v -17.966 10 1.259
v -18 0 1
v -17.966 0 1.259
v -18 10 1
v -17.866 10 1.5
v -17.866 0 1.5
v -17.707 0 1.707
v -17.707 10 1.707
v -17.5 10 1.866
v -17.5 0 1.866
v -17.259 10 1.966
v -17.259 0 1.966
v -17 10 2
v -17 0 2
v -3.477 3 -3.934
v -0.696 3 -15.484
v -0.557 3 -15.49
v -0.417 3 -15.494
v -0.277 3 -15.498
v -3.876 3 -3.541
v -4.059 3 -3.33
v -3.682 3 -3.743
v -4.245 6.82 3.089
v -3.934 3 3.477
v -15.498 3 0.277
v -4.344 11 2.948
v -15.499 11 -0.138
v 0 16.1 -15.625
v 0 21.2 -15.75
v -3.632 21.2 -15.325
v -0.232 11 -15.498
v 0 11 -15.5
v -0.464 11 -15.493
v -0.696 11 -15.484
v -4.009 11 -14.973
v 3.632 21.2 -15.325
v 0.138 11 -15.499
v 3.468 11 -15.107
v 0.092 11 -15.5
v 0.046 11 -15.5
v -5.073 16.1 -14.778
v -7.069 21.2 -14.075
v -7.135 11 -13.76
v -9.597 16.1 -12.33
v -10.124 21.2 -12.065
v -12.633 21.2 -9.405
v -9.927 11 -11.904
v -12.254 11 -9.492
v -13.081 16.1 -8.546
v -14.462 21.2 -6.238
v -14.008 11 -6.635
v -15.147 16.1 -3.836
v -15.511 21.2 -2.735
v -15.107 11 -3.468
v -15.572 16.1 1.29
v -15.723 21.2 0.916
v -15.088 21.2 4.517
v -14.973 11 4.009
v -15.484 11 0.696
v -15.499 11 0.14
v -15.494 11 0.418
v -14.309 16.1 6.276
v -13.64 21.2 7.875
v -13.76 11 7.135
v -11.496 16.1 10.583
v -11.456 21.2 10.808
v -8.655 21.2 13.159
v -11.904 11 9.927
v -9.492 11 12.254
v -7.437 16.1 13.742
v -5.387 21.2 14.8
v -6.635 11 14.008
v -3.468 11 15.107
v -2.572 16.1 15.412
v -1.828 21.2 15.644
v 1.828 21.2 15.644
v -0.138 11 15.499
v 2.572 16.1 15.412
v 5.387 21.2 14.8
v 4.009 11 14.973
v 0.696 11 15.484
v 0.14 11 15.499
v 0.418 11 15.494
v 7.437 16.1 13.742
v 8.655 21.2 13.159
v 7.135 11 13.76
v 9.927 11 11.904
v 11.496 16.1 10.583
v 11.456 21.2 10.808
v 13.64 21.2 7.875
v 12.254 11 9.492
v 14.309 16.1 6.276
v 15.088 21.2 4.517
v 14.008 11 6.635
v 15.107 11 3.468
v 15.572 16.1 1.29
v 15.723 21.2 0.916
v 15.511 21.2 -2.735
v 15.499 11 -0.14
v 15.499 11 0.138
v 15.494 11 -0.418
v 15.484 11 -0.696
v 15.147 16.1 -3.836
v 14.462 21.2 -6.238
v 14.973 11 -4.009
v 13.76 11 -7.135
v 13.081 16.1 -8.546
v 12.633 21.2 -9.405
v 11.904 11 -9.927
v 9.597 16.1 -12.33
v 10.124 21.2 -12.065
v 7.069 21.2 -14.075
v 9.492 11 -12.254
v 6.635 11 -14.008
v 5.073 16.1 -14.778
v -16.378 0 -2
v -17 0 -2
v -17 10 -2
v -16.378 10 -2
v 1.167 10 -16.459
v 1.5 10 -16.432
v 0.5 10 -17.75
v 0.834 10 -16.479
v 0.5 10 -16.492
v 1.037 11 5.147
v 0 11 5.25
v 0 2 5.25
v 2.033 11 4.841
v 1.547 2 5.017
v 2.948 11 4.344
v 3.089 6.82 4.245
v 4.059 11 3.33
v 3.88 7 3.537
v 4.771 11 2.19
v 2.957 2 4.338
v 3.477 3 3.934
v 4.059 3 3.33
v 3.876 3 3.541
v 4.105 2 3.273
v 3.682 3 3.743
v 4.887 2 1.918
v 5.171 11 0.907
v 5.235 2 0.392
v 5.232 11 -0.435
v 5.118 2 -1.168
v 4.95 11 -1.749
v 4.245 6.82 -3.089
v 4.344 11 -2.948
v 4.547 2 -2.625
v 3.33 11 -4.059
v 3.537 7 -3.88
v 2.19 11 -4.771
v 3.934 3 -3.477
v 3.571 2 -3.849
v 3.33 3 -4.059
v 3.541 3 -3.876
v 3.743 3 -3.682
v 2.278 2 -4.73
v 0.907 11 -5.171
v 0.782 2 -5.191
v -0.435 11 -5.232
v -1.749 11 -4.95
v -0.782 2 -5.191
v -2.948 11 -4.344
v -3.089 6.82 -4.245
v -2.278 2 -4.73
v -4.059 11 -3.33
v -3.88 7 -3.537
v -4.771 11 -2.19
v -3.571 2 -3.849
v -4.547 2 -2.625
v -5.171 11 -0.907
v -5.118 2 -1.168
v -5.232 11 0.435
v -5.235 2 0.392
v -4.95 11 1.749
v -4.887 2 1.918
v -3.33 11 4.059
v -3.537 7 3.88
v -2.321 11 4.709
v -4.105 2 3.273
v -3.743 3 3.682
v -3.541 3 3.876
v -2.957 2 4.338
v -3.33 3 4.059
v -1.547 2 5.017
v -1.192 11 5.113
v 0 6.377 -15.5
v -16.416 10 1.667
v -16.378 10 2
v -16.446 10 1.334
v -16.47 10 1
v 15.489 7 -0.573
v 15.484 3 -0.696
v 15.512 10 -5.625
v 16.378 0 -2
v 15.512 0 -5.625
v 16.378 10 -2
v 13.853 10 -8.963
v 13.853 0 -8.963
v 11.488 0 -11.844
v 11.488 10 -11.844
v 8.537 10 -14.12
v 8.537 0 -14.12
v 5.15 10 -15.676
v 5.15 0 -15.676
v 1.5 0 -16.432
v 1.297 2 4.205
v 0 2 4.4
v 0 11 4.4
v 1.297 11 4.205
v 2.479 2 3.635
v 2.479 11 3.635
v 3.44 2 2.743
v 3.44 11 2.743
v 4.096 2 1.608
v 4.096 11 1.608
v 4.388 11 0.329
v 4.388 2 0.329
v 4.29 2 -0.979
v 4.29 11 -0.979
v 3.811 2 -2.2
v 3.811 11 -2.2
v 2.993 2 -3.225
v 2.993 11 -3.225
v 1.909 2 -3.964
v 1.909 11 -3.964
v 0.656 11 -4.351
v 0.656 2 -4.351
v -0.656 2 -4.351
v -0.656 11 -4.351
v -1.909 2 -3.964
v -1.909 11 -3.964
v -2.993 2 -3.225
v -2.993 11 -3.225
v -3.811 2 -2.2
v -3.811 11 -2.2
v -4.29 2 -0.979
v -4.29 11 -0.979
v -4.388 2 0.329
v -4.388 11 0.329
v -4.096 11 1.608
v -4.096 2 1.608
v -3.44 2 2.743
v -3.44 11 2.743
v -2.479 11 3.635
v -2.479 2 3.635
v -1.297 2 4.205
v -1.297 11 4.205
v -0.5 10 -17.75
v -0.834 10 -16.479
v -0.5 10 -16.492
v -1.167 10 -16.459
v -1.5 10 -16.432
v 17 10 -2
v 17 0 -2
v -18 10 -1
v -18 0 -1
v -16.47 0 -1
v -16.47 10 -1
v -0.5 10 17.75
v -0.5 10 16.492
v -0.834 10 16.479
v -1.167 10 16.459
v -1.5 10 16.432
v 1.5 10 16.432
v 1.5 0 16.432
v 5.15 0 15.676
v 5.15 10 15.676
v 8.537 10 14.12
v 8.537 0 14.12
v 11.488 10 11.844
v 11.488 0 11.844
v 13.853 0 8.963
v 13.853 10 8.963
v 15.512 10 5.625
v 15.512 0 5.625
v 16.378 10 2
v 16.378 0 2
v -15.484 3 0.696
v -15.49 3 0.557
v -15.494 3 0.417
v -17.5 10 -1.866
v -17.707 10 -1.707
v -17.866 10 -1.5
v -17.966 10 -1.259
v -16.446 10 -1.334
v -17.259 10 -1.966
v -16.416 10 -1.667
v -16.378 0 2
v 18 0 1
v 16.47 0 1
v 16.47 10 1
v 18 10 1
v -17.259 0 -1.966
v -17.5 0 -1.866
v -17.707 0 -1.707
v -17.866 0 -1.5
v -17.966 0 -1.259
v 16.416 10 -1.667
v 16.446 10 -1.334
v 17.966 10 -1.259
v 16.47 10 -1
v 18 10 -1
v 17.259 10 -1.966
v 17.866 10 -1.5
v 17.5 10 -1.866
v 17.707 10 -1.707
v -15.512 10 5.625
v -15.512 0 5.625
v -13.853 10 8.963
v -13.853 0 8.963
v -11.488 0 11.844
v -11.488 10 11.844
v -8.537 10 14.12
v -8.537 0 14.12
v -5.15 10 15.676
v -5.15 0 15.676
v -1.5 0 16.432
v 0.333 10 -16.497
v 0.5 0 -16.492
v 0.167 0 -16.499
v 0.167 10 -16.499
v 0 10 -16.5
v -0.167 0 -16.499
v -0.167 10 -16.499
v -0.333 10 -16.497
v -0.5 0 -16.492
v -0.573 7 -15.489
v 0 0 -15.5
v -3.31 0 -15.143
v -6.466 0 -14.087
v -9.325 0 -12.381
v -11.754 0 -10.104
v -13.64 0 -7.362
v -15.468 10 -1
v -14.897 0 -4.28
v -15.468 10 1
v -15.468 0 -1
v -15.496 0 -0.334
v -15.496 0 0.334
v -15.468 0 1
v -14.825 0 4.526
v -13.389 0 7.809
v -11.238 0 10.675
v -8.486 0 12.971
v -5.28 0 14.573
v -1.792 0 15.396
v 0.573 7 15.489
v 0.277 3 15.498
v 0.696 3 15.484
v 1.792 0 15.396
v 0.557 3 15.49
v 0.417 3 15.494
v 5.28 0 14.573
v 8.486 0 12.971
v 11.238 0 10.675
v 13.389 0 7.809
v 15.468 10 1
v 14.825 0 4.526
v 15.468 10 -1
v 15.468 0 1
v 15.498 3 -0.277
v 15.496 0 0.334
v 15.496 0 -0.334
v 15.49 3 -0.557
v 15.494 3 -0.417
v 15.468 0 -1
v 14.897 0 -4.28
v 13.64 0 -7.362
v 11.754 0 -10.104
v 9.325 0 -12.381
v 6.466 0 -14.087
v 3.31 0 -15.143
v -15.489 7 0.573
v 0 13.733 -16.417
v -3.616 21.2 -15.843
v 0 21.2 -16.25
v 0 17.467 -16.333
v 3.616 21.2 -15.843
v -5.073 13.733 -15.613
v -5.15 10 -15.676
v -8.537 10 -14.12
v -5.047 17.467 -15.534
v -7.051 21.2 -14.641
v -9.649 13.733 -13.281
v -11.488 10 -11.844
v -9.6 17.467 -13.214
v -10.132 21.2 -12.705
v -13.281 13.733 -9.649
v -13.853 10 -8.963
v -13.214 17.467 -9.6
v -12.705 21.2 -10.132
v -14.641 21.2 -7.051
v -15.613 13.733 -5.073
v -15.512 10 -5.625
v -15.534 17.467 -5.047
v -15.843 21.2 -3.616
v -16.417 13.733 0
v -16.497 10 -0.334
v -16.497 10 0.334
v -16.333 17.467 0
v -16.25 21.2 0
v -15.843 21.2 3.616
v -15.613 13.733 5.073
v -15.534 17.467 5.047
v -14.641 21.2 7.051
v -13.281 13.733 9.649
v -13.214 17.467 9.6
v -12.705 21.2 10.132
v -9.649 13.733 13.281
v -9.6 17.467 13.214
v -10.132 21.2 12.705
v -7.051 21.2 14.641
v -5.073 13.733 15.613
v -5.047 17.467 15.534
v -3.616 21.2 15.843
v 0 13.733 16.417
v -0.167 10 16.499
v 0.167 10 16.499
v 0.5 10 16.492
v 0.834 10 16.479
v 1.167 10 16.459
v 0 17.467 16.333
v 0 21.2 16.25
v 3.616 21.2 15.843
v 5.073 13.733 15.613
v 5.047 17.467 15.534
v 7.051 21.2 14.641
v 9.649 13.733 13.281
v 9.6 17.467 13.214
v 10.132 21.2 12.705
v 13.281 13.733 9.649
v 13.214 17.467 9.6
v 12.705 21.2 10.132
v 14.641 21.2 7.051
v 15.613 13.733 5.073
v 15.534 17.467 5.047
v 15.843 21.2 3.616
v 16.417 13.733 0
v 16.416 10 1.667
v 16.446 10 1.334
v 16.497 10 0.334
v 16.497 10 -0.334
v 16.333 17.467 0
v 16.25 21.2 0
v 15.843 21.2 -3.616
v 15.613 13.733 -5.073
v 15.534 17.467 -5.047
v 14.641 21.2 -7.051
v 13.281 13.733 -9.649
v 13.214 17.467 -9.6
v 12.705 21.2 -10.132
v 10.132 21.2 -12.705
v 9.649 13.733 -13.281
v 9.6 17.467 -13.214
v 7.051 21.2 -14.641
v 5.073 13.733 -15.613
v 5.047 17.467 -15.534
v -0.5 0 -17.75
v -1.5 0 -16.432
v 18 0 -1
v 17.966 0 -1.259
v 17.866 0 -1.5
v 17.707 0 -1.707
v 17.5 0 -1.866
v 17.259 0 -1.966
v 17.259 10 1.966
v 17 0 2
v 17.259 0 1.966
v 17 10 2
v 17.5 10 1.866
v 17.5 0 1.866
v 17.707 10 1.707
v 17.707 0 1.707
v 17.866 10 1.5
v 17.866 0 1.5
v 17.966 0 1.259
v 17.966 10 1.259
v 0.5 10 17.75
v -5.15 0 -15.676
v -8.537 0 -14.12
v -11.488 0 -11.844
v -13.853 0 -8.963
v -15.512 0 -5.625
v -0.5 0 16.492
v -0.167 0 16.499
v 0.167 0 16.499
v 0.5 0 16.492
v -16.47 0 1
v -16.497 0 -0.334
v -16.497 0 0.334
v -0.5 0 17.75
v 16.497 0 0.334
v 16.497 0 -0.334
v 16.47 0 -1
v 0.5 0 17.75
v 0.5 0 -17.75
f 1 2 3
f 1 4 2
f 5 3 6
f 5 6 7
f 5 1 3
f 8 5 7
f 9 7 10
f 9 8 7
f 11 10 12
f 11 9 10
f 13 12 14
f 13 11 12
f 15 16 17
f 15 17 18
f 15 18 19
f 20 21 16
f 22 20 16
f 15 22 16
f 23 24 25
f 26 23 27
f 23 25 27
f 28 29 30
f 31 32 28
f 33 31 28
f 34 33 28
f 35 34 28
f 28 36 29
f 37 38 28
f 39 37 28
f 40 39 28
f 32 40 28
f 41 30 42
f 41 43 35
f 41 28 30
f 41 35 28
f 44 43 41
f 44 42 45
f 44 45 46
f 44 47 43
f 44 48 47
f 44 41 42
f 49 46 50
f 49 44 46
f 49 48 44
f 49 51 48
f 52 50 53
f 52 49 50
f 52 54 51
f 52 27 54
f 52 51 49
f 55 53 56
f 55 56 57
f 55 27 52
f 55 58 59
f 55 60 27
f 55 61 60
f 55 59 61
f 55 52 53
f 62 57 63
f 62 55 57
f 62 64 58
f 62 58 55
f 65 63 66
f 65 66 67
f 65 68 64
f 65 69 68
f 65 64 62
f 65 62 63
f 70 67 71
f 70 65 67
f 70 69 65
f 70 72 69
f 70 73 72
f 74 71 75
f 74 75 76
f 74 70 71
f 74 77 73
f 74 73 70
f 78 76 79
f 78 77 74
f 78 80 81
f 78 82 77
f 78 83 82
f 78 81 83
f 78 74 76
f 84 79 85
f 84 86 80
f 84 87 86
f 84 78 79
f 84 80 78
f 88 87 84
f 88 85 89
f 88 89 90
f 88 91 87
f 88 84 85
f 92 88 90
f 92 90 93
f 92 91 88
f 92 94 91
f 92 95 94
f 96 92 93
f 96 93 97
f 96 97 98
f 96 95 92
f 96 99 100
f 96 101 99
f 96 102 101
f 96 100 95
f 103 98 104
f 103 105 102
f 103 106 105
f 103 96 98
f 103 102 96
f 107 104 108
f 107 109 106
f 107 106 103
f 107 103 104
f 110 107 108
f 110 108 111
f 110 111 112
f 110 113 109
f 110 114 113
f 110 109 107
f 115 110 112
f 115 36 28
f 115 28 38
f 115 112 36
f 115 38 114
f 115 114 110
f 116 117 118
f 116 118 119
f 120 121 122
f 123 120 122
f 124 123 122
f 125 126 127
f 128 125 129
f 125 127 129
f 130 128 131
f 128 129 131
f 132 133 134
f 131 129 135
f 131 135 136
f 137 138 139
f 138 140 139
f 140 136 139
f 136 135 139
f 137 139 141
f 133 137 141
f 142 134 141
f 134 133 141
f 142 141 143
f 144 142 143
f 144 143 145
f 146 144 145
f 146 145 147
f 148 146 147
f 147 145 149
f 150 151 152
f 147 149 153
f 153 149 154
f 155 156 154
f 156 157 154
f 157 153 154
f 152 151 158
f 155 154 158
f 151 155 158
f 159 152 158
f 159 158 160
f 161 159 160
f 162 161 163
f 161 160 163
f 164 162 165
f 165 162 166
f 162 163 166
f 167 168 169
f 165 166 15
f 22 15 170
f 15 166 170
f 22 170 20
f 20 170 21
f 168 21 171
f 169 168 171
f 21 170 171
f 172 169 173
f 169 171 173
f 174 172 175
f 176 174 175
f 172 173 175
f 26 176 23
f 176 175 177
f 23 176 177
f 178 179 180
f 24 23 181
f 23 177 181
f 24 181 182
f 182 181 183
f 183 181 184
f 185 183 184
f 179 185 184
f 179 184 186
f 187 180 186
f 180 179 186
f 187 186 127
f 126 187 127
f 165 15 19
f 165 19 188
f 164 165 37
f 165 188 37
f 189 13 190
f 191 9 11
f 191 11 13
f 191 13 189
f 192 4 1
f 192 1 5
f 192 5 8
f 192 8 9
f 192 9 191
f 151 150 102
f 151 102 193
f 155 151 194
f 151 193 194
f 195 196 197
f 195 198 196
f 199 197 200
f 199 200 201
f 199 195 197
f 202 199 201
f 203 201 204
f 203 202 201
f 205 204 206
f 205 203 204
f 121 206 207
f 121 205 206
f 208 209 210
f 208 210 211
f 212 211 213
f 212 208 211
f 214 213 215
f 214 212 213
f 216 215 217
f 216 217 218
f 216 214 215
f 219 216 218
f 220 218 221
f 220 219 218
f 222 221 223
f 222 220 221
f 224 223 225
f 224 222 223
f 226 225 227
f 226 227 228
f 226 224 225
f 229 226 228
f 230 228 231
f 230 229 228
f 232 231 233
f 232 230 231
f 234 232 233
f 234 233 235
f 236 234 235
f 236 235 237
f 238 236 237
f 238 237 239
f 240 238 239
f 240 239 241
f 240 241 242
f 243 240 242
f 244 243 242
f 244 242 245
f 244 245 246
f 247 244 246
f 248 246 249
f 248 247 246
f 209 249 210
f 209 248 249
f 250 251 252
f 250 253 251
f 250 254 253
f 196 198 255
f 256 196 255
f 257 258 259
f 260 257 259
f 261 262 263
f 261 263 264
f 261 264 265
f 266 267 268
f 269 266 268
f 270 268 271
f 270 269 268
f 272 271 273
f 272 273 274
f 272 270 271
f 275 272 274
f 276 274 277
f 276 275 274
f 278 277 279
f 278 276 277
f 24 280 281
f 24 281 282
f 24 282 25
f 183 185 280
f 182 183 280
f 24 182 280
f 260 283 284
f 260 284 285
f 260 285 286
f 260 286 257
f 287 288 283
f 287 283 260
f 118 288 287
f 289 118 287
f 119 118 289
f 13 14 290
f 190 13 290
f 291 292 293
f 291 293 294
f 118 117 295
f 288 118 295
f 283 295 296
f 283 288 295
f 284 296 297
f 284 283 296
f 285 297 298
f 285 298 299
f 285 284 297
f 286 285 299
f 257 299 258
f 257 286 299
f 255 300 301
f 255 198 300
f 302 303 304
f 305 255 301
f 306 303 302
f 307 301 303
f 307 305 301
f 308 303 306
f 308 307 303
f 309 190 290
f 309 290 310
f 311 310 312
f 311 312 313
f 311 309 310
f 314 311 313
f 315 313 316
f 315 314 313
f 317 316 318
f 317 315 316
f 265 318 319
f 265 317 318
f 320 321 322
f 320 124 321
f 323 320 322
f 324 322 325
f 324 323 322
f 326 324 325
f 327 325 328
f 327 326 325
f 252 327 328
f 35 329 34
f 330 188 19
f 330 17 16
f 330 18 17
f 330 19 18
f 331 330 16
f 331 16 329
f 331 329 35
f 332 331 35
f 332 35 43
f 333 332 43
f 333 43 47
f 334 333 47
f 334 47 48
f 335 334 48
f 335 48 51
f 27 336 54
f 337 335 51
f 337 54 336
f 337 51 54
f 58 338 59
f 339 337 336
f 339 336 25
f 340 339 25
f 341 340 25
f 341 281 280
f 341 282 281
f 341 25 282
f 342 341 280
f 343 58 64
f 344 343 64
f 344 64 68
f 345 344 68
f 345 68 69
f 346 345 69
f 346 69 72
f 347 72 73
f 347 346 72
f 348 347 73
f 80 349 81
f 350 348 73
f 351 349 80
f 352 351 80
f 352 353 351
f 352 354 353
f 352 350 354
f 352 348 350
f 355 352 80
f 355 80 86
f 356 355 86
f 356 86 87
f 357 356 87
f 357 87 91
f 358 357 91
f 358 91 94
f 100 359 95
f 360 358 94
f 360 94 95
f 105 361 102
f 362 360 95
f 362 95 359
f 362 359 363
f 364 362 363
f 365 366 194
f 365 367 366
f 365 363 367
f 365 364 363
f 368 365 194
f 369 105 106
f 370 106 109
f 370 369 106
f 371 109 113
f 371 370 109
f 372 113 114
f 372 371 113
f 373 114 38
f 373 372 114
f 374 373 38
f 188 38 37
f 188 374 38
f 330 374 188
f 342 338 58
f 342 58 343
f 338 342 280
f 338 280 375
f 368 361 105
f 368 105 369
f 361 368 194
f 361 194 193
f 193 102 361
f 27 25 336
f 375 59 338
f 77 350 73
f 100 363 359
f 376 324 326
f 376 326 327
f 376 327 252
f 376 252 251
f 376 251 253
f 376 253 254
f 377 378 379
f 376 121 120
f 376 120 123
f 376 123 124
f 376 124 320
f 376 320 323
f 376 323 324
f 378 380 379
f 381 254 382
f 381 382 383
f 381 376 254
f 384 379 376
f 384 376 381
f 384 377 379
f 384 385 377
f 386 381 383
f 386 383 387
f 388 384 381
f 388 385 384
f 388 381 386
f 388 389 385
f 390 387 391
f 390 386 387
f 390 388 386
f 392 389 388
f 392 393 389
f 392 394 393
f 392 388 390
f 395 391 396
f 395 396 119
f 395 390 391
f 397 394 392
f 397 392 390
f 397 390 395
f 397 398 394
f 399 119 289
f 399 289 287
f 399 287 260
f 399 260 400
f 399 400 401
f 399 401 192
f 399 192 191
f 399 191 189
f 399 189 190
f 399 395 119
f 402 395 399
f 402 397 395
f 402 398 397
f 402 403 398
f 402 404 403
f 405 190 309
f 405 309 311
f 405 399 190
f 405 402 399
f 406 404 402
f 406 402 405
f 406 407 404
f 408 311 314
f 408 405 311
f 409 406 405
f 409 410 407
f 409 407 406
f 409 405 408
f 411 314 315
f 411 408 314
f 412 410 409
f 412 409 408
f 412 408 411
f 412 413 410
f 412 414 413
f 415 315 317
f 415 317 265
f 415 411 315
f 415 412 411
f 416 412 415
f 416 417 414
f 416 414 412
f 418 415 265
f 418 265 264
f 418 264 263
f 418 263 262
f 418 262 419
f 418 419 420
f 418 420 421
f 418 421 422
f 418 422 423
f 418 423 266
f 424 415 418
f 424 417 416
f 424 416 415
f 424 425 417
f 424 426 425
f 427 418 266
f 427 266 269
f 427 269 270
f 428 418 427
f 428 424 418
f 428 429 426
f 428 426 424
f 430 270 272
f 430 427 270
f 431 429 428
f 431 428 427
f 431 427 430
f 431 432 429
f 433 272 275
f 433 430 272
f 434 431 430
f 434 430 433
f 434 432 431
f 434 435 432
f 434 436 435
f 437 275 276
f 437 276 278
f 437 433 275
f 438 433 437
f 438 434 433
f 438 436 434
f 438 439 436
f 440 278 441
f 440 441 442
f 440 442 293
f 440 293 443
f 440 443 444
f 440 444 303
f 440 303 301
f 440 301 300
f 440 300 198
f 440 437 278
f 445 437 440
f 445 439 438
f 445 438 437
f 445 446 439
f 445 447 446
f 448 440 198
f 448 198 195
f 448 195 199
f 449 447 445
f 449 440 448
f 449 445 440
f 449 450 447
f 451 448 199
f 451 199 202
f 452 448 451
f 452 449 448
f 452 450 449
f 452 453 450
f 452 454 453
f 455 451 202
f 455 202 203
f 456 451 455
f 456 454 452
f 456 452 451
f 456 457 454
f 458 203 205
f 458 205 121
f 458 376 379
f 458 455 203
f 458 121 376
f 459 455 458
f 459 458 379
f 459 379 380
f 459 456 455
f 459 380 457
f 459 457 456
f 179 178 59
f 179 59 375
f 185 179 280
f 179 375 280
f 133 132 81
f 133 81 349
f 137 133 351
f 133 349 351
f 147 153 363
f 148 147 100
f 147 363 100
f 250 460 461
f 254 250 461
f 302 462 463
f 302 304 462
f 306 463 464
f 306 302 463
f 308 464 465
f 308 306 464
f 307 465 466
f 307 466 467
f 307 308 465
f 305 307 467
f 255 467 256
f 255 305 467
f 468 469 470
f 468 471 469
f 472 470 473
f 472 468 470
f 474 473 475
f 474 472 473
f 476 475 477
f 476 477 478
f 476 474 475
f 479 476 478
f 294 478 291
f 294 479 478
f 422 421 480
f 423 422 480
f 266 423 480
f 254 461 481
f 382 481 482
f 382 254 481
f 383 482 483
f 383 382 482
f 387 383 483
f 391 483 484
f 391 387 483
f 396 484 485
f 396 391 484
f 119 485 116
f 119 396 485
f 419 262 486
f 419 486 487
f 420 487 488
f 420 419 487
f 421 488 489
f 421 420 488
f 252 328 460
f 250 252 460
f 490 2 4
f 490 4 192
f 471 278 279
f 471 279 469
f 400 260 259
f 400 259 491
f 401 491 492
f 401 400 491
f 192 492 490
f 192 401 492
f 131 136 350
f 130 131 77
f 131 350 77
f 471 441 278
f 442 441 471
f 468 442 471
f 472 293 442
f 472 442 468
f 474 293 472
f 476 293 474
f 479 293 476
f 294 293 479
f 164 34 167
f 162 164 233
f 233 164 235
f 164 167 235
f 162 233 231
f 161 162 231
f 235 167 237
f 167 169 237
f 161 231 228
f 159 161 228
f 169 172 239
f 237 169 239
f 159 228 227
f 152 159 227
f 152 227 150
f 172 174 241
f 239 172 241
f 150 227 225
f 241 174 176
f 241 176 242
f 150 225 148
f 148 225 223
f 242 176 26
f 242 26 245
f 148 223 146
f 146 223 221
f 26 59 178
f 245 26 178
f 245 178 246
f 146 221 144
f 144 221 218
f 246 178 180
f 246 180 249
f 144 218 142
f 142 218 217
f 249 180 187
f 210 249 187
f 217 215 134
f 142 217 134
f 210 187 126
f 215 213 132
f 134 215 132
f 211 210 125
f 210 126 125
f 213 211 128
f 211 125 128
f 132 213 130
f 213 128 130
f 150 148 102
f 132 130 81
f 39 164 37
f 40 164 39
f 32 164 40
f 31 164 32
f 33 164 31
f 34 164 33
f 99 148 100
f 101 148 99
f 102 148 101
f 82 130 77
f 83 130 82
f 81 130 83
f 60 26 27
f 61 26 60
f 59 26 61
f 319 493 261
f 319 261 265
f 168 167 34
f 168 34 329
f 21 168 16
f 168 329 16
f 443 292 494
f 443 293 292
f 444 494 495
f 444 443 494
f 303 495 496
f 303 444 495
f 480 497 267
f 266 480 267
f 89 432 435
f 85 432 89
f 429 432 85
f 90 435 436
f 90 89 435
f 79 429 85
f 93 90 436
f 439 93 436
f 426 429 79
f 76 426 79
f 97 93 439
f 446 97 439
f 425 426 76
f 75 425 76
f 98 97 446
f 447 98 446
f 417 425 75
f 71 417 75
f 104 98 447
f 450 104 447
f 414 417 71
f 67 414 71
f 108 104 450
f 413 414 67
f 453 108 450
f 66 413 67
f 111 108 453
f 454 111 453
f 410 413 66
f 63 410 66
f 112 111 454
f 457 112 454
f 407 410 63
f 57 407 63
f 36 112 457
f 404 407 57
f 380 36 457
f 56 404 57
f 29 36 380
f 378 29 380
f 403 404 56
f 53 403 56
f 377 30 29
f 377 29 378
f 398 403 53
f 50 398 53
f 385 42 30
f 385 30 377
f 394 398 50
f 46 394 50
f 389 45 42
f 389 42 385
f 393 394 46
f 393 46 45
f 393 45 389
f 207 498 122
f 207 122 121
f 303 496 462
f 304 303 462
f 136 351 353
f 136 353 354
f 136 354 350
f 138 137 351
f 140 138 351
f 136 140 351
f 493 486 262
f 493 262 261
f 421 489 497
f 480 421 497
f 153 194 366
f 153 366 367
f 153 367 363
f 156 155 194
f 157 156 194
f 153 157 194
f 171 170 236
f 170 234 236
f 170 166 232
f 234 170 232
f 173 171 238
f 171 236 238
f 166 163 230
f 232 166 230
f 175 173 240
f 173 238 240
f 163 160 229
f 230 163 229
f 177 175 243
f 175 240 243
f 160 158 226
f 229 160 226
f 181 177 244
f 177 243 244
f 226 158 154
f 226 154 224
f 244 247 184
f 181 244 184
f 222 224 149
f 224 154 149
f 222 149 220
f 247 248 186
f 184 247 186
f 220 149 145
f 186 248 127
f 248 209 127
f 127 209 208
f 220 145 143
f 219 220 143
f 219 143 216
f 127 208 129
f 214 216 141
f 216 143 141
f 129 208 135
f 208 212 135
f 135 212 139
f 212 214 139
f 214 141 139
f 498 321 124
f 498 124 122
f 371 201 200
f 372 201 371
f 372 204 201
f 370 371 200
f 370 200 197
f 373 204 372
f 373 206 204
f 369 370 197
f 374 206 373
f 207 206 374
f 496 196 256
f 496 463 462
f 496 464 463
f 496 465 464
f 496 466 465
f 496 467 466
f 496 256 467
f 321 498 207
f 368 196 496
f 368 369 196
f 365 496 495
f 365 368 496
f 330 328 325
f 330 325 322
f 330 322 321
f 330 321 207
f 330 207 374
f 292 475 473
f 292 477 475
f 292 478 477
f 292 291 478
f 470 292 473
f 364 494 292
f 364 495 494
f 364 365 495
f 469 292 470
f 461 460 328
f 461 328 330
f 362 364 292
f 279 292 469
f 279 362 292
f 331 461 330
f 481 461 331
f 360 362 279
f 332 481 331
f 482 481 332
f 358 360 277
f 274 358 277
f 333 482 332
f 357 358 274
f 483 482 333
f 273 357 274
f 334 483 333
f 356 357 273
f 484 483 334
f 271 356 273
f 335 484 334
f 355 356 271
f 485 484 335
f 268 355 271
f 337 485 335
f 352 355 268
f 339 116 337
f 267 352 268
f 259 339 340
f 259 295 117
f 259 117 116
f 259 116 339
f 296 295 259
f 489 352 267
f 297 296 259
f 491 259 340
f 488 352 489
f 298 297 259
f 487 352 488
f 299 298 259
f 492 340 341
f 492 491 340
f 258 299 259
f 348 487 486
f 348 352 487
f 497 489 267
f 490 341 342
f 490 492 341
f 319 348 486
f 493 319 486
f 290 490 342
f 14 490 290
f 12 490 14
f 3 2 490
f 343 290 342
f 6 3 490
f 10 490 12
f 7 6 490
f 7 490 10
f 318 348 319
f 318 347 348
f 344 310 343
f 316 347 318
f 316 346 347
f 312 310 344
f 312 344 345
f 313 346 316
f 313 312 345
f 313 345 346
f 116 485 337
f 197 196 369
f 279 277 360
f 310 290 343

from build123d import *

# Parameters (mm, degrees)
SKETCH2_W           = 2.532291702
SKETCH2_H           = 1
BOSS_EXTRUDE1_DEPTH = 10
FILLET1_R           = 1
BOSS_EXTRUDE2_START = 2
SKETCH3_R           = 5.25
SKETCH3_R_2         = 4.4
BOSS_EXTRUDE2_DEPTH = 9
BOSS_EXTRUDE3_START = -0.893384
BOSS_EXTRUDE3_DEPTH = 13.479999236
CIRPATTERN2_COUNT   = 4


with BuildPart() as part:
    # Sketch1 → Revolve1 (revolve)
    with BuildSketch(Plane.XY, mode=Mode.PRIVATE) as revolve1_sk:
        Polygon((15.5, 11), (15.5, 0), (16.5, 0), (16.5, 10), (16.25, 21.2), (15.75, 21.2), align=None)
    revolve(revolve1_sk.sketch.rotate(Axis((0, 0, 0), (0, 1, 0)), 90), axis=Axis((0, 0, 0), (0, 1, 0)))

    # Sketch2 → Boss-Extrude1 (add)
    with BuildSketch(Plane(origin=(0, 0, 0), x_dir=(1, 0, 0), z_dir=(0, 1, 0))):
        with Locations((16.733854149, -1.5)):
            Rectangle(SKETCH2_W, SKETCH2_H)
        with Locations((16.733854149, 1.5)):
            Rectangle(SKETCH2_W, SKETCH2_H)
        with Locations((-16.733854149, 1.5)):
            Rectangle(SKETCH2_W, SKETCH2_H)
        with Locations((-16.733854149, -1.5)):
            Rectangle(SKETCH2_W, SKETCH2_H)
        Polygon((0.5, -16.492422502), (0.5, -17.75), (1.5, -16.431676725), align=None)
        Polygon((-0.5, -17.75), (-1.5, -16.431676725), (-0.5, -16.492422502), align=None)
        Polygon((0.5, 17.75), (1.5, 16.431676725), (0.5, 16.492422502), align=None)
        Polygon((-0.5, 16.492422502), (-0.5, 17.75), (-1.5, 16.431676725), align=None)
    extrude(amount=BOSS_EXTRUDE1_DEPTH)

    # Fillet1
    fillet1_edges = [part.edges().sort_by_distance(p)[0] for p in [
        (-18, 5, -2),
        (-18, 5, 2),
        (18, 5, -2),
        (18, 5, 2),
    ]]
    fillet(fillet1_edges, radius=FILLET1_R - 0.0001)  # a hair under: the kernel refuses the full size


with BuildPart() as body_2:
    # Sketch3 → Boss-Extrude2 (new body)
    with BuildSketch(Plane(origin=(0, 0, 0), x_dir=(1, 0, 0), z_dir=(0, 1, 0)).offset(BOSS_EXTRUDE2_START)):
        with Locations(Location((0, 0, 0), (0, 0, 270))):
            Circle(SKETCH3_R)
        with Locations(Location((0, 0, 0), (0, 0, 270))):
            Circle(SKETCH3_R_2, mode=Mode.SUBTRACT)
    extrude(amount=BOSS_EXTRUDE2_DEPTH)


with BuildPart() as body_3:
    # Sketch5 → Boss-Extrude3 (new body)
    with BuildSketch(Plane(origin=(15.902515524, 0, 4.4), x_dir=(0.2666666666666668, 0, -0.9637888196533974), z_dir=(0.9637888196533975, 0, 0.2666666666666668)).offset(BOSS_EXTRUDE3_START)):
        with BuildLine():
            Line((4, 11), (4.8, 11))
            ThreePointArc((4.8, 11), (4.682488051, 7), (4.8, 3))
            Line((4.8, 3), (4.4, 3))
            ThreePointArc((4.4, 3), (4.100062422, 6.995003121), (4, 11))
        make_face()
    extrude(amount=-BOSS_EXTRUDE3_DEPTH)


with BuildPart() as cirpattern2_1:
    # CirPattern2: pattern copy
    add(body_3.part.rotate(Axis((0, 0, 0), (0, 1, 0)), 1 * 360 / CIRPATTERN2_COUNT))


with BuildPart() as cirpattern2_2:
    # CirPattern2: pattern copy
    add(body_3.part.rotate(Axis((0, 0, 0), (0, 1, 0)), 2 * 360 / CIRPATTERN2_COUNT))


with BuildPart() as cirpattern2_3:
    # CirPattern2: pattern copy
    add(body_3.part.rotate(Axis((0, 0, 0), (0, 1, 0)), 3 * 360 / CIRPATTERN2_COUNT))


with BuildPart() as part_1:
    add(part.part)

    # Combine1: union body 2, body 3, CirPattern2_1, CirPattern2_2, CirPattern2_3
    add(body_2.part)
    add(body_3.part)
    add(cirpattern2_1.part)
    add(cirpattern2_2.part)
    add(cirpattern2_3.part)


solid = part_1.part
